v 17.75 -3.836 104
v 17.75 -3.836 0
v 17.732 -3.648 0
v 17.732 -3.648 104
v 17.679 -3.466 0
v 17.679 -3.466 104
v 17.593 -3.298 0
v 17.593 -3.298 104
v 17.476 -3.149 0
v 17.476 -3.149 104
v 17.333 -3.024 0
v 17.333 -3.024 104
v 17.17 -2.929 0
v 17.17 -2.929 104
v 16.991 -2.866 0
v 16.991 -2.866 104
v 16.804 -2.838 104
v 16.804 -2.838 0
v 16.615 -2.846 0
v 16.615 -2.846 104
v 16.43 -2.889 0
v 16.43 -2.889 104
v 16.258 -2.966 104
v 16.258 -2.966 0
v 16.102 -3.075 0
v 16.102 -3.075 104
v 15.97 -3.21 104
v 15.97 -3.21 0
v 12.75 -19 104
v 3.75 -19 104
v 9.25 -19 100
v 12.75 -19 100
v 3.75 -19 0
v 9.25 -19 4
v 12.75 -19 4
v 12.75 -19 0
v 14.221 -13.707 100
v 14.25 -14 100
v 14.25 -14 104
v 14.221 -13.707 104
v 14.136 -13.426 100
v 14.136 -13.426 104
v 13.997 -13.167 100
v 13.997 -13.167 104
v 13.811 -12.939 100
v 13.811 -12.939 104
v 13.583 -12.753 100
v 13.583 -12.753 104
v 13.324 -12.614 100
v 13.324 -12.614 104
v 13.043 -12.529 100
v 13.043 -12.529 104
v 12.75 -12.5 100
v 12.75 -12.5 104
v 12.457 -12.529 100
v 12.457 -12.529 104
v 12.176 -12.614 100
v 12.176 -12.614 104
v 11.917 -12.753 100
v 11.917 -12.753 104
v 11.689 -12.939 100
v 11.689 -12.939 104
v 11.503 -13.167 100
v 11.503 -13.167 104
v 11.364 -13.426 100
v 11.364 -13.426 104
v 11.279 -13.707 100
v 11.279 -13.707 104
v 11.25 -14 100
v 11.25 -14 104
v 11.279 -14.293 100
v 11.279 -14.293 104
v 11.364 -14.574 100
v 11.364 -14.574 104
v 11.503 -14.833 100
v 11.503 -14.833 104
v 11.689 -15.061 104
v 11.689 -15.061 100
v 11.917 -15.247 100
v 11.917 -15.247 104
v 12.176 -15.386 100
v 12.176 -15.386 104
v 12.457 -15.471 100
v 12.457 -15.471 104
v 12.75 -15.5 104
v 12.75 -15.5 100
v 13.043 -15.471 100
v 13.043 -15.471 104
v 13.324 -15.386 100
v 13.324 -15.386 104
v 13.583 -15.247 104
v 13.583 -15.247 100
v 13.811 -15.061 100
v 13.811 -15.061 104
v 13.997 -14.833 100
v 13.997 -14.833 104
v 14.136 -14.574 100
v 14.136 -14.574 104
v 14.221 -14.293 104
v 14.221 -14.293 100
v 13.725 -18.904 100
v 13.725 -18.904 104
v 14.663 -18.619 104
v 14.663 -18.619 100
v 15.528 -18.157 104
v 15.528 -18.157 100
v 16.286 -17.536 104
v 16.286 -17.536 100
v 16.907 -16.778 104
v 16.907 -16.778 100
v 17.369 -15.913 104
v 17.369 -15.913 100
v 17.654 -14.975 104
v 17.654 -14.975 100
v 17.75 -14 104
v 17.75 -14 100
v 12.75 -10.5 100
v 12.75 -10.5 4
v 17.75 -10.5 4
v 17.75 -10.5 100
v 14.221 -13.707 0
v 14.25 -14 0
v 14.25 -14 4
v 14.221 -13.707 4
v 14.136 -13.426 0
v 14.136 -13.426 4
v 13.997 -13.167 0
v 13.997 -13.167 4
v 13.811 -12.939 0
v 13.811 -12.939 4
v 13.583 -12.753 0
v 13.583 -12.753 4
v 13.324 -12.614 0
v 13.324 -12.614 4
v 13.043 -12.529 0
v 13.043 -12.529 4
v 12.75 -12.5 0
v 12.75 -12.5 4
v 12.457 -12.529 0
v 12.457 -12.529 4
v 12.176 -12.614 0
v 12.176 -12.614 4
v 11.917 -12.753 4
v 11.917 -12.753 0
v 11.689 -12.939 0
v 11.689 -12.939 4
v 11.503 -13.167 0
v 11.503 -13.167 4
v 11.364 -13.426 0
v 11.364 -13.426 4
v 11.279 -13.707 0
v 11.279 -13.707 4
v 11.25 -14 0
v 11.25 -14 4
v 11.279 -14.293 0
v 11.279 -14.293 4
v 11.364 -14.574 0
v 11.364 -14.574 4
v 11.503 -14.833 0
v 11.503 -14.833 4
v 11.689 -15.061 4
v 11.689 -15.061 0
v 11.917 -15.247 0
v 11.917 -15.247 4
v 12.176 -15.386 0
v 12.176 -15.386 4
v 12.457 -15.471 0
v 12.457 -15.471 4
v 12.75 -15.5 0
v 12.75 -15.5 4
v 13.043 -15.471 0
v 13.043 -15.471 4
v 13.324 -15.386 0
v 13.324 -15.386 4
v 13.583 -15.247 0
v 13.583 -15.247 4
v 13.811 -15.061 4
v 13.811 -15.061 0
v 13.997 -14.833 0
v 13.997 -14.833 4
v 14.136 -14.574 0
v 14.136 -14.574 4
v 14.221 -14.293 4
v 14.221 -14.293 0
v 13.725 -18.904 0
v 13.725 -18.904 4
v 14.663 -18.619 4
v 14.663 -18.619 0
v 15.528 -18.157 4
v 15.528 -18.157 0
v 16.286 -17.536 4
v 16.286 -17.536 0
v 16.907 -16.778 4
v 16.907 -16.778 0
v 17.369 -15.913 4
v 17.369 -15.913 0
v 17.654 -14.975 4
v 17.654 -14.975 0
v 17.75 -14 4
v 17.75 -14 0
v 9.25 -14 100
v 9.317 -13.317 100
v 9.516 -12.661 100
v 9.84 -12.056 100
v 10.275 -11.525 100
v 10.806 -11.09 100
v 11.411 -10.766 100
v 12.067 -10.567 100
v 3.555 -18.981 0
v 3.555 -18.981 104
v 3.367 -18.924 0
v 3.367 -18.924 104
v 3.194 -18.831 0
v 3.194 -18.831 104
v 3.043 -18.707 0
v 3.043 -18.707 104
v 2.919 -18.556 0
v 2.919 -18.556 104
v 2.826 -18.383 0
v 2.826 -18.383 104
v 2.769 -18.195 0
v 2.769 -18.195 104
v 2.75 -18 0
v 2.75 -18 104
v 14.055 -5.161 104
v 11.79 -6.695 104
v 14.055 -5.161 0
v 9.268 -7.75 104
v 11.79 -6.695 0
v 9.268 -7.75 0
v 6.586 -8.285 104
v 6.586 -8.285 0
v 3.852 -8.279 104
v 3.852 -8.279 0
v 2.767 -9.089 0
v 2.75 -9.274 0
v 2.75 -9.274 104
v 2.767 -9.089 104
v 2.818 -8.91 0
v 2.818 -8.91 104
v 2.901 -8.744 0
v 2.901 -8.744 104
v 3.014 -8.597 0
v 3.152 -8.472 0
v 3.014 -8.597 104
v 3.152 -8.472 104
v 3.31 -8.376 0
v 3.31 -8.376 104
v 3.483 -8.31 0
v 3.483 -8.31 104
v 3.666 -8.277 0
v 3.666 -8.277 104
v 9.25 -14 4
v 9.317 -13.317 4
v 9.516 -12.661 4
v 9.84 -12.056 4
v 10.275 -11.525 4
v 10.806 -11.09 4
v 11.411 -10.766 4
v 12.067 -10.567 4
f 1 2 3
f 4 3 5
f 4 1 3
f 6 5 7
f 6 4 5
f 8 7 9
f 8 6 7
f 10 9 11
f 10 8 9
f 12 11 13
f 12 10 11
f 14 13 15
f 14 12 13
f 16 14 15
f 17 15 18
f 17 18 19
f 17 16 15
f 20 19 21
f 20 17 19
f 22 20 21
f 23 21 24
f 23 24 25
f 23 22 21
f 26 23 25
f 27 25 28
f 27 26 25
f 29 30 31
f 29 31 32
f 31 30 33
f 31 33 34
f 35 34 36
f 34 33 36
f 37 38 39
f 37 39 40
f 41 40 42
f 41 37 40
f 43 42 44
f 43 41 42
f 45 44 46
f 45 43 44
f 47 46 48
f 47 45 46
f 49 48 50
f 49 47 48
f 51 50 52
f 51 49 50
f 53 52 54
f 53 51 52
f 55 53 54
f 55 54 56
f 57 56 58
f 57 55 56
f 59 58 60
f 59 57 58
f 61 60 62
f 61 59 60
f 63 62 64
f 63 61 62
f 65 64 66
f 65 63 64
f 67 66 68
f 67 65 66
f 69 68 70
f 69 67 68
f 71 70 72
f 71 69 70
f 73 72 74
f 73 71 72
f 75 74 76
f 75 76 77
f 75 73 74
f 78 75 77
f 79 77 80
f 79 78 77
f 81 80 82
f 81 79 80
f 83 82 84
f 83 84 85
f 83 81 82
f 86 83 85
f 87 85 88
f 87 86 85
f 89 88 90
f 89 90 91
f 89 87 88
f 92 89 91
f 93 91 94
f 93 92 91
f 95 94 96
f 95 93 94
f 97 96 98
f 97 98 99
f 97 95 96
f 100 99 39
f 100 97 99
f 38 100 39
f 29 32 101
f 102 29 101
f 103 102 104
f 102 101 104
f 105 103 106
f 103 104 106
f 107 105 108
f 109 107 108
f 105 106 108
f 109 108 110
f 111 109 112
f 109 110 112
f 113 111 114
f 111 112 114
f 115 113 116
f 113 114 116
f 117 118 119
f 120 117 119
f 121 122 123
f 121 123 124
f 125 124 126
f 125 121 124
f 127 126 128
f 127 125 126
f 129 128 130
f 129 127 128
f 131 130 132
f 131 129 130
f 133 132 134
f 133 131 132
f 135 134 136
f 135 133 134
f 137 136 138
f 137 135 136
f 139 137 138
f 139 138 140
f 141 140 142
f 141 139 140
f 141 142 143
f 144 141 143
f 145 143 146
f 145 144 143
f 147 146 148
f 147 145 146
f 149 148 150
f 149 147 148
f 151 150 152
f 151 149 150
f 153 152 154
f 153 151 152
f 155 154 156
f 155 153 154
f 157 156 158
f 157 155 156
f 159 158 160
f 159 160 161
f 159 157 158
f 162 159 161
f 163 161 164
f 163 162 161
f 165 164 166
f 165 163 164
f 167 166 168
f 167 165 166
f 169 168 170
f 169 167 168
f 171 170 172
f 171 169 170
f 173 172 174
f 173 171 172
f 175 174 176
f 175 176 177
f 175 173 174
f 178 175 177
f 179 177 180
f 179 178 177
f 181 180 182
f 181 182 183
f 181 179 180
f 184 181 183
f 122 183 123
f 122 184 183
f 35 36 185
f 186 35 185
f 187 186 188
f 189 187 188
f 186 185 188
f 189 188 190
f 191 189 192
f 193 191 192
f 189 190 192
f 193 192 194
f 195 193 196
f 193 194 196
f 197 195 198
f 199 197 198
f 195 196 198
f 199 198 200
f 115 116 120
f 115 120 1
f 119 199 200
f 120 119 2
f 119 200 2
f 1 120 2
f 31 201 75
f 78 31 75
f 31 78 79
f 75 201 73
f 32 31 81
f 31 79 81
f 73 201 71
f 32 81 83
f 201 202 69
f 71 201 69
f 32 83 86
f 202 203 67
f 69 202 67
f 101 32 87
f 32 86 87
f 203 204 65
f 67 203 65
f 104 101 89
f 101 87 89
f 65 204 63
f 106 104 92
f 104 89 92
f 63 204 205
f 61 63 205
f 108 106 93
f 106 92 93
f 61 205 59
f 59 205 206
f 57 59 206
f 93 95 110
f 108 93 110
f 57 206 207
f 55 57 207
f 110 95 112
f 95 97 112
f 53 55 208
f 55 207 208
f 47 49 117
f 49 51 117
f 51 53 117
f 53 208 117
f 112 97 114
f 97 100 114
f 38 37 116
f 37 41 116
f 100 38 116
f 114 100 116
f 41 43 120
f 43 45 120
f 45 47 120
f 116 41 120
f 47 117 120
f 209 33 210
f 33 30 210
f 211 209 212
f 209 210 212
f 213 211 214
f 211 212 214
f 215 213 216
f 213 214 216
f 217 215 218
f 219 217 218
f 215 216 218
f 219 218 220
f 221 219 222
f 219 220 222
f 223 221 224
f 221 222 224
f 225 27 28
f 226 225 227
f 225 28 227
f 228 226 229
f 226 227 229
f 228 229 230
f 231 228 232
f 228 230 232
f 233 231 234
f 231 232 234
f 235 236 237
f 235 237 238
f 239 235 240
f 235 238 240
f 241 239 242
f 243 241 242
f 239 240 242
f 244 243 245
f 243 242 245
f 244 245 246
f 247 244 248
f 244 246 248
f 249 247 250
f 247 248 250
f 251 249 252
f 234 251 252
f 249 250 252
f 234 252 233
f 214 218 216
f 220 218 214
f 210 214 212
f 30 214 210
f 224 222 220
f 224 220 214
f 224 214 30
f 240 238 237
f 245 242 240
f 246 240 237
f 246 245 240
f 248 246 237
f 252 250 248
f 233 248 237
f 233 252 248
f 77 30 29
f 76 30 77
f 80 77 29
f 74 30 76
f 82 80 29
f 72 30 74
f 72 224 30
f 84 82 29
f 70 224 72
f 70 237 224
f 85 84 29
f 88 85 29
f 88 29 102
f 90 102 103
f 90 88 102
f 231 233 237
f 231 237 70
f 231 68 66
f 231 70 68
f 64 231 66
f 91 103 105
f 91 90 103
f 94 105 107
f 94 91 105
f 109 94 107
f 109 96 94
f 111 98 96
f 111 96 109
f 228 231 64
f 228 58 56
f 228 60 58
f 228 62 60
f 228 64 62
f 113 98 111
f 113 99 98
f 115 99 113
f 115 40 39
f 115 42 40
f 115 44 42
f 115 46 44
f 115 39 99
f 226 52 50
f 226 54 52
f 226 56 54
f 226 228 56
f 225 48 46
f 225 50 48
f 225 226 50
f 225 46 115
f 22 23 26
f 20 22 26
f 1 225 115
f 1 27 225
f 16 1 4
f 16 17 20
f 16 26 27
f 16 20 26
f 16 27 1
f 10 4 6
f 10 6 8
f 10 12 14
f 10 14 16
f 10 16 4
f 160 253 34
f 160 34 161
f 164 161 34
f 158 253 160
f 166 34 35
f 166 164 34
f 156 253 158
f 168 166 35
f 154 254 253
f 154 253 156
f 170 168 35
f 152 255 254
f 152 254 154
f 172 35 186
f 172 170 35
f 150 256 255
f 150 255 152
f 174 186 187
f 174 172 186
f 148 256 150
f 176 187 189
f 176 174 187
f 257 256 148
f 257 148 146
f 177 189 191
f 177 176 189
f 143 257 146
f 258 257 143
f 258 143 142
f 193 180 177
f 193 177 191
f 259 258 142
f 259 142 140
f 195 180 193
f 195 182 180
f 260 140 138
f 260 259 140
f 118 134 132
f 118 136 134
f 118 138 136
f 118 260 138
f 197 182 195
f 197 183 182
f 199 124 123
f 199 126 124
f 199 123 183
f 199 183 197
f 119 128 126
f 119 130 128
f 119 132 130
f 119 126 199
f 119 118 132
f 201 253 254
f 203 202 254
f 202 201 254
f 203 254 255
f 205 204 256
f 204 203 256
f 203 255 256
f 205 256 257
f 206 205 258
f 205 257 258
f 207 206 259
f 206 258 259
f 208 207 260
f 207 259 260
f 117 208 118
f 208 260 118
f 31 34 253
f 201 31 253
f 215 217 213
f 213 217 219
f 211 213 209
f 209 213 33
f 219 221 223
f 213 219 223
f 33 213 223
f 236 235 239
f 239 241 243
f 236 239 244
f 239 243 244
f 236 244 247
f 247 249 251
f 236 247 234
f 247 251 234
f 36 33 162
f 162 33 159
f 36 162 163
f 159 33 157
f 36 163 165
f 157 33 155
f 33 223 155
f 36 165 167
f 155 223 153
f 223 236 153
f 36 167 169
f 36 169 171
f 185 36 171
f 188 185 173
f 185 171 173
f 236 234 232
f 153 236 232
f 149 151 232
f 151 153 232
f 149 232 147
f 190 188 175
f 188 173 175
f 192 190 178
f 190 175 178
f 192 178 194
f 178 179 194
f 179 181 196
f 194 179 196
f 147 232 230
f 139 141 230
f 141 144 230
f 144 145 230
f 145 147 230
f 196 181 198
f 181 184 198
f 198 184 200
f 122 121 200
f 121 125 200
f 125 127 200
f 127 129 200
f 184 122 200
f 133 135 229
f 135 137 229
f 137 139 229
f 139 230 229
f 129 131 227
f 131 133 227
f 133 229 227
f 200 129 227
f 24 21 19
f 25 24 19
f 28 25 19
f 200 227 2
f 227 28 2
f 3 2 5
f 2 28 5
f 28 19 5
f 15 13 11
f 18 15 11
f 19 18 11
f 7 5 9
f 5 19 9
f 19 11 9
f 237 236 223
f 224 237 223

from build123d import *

# Parameters (mm, degrees)
EXTRUDE_1_DEPTH = 104
SKETCH_1_23_R   = 1.5
EXTRUDE_2_DEPTH = 4
EXTRUDE_START   = 100
SKETCH_1_24_R   = 1.5
EXTRUDE_3_DEPTH = 4
FILLET_1_R      = 1


with BuildPart() as part:
    # 草图1 → 凸台-拉伸1 (new body)
    with BuildSketch(Plane.XY):
        with BuildLine():
            Line((17.75, -10.5), (17.75, -0.328219619))
            ThreePointArc((17.75, -0.328219619), (11.588859881, -6.801694776), (2.75, -8.120817283))
            Line((2.75, -8.120817283), (2.75, -19))
            Line((2.75, -19), (9.25, -19))
            Line((9.25, -19), (9.25, -14))
            ThreePointArc((9.25, -14), (10.275126266, -11.525126266), (12.75, -10.5))
            Line((12.75, -10.5), (17.75, -10.5))
        make_face()
    extrude(amount=EXTRUDE_1_DEPTH)

    # 草图1<23> → 凸台-拉伸2 (add)
    with BuildSketch(Plane.XY):
        with BuildLine():
            Line((17.75, -14), (17.75, -10.5))
            Line((17.75, -10.5), (12.75, -10.5))
            ThreePointArc((12.75, -10.5), (10.275126266, -11.525126266), (9.25, -14))
            Line((9.25, -14), (9.25, -19))
            Line((9.25, -19), (12.75, -19))
            ThreePointArc((12.75, -19), (16.285533906, -17.535533906), (17.75, -14))
        make_face()
        with Locations((12.75, -14)):
            Circle(SKETCH_1_23_R, mode=Mode.SUBTRACT)
    extrude(amount=EXTRUDE_2_DEPTH)

    # 草图1<24> → 凸台-拉伸3 (add)
    with BuildSketch(Plane.XY.offset(EXTRUDE_START)):
        with BuildLine():
            Line((17.75, -14), (17.75, -10.5))
            Line((17.75, -10.5), (12.75, -10.5))
            ThreePointArc((12.75, -10.5), (10.275126266, -11.525126266), (9.25, -14))
            Line((9.25, -14), (9.25, -19))
            Line((9.25, -19), (12.75, -19))
            ThreePointArc((12.75, -19), (16.285533906, -17.535533906), (17.75, -14))
        make_face()
        with Locations((12.75, -14)):
            Circle(SKETCH_1_24_R, mode=Mode.SUBTRACT)
    extrude(amount=EXTRUDE_3_DEPTH)

    # 圆角1
    fillet_1_edges = [part.edges().sort_by_distance(p)[0] for p in [
        (2.75, -19, 52),
        (2.75, -8.120817283, 52),
        (17.75, -0.328219619, 52),
    ]]
    fillet(fillet_1_edges, radius=FILLET_1_R)


solid = part.part
